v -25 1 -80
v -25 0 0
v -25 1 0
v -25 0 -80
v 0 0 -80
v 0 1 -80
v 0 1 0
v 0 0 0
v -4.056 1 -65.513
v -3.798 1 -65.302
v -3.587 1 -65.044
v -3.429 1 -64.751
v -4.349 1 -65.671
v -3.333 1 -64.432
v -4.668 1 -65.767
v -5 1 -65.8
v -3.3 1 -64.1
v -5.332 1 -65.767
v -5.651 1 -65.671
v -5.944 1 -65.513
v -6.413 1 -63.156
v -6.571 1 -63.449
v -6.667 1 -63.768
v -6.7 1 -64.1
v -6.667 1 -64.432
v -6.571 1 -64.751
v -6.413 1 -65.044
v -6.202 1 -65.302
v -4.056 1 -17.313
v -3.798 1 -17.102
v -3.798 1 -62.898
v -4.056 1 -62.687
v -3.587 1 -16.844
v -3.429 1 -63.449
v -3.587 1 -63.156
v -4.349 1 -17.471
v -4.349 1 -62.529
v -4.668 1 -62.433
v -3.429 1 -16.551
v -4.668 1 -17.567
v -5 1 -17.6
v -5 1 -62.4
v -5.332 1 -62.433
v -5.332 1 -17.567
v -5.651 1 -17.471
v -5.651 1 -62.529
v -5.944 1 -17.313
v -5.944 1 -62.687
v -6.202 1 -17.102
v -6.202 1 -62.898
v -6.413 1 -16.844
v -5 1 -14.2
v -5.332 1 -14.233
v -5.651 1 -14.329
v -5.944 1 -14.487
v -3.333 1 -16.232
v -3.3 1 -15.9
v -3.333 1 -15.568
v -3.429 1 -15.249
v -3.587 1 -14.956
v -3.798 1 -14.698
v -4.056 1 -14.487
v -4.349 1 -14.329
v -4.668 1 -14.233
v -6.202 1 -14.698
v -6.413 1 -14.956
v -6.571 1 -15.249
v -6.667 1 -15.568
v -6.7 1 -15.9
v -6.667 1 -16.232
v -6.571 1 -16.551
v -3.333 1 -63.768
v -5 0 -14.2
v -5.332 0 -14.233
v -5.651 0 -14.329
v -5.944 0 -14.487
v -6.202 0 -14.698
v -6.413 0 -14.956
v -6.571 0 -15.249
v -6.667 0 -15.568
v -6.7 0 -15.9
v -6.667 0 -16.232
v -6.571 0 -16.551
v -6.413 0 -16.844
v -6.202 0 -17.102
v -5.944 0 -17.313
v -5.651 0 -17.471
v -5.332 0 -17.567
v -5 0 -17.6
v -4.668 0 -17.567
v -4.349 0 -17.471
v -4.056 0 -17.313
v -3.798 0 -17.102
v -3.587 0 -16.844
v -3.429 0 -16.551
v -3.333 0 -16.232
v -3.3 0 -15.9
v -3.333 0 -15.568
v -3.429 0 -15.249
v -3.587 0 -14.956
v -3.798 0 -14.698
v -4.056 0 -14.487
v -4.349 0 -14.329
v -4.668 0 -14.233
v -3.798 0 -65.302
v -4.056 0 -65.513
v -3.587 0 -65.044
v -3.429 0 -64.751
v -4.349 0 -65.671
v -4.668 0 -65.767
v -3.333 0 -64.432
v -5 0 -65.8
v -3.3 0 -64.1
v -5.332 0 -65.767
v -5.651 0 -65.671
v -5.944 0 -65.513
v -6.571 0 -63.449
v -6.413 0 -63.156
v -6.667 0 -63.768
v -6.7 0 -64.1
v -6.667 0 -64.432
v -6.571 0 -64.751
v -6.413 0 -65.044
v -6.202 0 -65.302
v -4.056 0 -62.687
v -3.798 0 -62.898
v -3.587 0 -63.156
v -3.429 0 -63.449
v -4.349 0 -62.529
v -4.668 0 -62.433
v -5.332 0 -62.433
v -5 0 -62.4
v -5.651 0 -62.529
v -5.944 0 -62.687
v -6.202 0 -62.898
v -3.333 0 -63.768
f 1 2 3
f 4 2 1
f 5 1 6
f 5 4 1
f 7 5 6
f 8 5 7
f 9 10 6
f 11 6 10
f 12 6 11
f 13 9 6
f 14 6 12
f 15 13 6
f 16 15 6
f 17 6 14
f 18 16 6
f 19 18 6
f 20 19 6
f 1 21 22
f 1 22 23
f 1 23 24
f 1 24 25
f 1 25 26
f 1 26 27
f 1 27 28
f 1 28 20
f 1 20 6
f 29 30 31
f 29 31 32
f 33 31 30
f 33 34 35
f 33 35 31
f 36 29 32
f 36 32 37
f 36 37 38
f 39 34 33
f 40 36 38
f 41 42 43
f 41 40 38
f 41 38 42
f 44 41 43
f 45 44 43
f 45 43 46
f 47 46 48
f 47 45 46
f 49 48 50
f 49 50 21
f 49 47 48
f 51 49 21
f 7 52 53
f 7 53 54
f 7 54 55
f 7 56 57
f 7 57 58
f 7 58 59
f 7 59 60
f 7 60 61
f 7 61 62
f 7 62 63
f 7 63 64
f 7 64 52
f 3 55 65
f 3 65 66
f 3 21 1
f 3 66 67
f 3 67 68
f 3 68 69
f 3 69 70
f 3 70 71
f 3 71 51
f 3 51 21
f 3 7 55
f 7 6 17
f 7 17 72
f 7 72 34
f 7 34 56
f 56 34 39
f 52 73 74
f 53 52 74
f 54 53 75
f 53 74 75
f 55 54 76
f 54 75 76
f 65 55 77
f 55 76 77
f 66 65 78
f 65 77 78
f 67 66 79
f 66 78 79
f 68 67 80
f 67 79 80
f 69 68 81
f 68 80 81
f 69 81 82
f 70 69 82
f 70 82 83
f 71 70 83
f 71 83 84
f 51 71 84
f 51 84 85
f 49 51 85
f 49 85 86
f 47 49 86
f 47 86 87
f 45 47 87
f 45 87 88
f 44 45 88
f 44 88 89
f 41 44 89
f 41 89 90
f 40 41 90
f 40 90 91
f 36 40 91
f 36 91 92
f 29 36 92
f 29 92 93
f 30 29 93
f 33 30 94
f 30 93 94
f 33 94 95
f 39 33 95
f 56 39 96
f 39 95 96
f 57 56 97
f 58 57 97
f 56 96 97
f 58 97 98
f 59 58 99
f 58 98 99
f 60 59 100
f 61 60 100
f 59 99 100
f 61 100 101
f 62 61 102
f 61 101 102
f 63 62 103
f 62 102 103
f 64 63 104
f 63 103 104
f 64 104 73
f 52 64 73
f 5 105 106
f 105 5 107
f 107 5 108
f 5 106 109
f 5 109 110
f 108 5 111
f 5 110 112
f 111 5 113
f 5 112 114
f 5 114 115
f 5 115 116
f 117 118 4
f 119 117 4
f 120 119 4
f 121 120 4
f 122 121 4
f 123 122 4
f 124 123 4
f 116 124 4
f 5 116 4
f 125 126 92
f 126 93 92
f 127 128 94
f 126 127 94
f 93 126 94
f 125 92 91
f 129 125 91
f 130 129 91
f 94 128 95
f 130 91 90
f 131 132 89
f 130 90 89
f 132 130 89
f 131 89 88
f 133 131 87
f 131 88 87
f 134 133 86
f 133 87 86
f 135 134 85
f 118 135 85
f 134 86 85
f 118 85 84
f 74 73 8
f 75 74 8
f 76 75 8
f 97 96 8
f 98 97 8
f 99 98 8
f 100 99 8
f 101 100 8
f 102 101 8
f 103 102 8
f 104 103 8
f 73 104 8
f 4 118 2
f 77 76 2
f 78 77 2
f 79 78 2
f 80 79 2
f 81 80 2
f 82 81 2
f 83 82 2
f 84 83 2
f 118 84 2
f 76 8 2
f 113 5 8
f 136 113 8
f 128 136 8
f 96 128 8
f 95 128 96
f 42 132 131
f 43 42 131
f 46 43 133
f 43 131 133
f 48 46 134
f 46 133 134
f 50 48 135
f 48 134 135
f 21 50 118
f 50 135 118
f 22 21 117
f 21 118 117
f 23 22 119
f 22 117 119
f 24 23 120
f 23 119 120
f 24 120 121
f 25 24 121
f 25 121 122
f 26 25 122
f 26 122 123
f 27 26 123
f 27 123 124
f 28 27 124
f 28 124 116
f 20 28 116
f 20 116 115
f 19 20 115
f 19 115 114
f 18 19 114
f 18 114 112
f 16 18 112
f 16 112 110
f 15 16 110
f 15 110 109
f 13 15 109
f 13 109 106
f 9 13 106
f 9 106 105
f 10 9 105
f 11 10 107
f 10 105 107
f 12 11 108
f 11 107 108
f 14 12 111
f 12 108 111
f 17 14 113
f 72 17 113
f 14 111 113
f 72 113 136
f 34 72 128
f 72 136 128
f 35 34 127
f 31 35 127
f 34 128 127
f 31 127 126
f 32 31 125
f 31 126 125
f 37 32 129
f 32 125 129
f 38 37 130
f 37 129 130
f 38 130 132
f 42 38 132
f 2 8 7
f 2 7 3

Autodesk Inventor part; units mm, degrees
ref_plane "YZ Plane" through (0, 0, 0) normal (1, 0, 0) x (0, 1, 0)
ref_plane "XZ Plane" through (0, 0, 0) normal (0, 1, 0) x (-1, 0, 0)
ref_plane "XY Plane" through (0, 0, 0) normal (0, 0, 1) x (1, 0, 0)
sketch "Sketch3" plane through (0, 0, 0) normal (0, 1, 0) x (-1, 0, 0)
  line L0 (0, 0) -> (25, 0)
  line L1 (25, 0) -> (25, -80)
  line L2 (25, -80) -> (0, -80)
  line L3 (0, -80) -> (0, 0)
  dimension "d21" = 25
  dimension "d22" = 80
extrude "Extrusion2" add sketch "Sketch3" along normal blind 1
sketch "Sketch4" plane through (0, 1, 0) normal (0, 1, 0) x (1, 0, 0)
  line L0 (-25, 80) -> (-25, 0) construction
  line L1 (-25, 40) -> (0, 40) construction
  line L2 (0, 0) -> (0, 80) construction
  point P0 (-5, 15.9)
  point P1 (-5, 64.1)
  dimension "d25" = 5
  dimension "d26" = 48.2
hole "Hole2" at (-5, 1, -15.9) at (-5, 1, -64.1) direction (0, -1, 0) diameter 3.4 end through all clearance for "Countersunk Flat Head Screw ISO 2009/7046" size "M3" standard "ISO"
properties part number "PCB"
